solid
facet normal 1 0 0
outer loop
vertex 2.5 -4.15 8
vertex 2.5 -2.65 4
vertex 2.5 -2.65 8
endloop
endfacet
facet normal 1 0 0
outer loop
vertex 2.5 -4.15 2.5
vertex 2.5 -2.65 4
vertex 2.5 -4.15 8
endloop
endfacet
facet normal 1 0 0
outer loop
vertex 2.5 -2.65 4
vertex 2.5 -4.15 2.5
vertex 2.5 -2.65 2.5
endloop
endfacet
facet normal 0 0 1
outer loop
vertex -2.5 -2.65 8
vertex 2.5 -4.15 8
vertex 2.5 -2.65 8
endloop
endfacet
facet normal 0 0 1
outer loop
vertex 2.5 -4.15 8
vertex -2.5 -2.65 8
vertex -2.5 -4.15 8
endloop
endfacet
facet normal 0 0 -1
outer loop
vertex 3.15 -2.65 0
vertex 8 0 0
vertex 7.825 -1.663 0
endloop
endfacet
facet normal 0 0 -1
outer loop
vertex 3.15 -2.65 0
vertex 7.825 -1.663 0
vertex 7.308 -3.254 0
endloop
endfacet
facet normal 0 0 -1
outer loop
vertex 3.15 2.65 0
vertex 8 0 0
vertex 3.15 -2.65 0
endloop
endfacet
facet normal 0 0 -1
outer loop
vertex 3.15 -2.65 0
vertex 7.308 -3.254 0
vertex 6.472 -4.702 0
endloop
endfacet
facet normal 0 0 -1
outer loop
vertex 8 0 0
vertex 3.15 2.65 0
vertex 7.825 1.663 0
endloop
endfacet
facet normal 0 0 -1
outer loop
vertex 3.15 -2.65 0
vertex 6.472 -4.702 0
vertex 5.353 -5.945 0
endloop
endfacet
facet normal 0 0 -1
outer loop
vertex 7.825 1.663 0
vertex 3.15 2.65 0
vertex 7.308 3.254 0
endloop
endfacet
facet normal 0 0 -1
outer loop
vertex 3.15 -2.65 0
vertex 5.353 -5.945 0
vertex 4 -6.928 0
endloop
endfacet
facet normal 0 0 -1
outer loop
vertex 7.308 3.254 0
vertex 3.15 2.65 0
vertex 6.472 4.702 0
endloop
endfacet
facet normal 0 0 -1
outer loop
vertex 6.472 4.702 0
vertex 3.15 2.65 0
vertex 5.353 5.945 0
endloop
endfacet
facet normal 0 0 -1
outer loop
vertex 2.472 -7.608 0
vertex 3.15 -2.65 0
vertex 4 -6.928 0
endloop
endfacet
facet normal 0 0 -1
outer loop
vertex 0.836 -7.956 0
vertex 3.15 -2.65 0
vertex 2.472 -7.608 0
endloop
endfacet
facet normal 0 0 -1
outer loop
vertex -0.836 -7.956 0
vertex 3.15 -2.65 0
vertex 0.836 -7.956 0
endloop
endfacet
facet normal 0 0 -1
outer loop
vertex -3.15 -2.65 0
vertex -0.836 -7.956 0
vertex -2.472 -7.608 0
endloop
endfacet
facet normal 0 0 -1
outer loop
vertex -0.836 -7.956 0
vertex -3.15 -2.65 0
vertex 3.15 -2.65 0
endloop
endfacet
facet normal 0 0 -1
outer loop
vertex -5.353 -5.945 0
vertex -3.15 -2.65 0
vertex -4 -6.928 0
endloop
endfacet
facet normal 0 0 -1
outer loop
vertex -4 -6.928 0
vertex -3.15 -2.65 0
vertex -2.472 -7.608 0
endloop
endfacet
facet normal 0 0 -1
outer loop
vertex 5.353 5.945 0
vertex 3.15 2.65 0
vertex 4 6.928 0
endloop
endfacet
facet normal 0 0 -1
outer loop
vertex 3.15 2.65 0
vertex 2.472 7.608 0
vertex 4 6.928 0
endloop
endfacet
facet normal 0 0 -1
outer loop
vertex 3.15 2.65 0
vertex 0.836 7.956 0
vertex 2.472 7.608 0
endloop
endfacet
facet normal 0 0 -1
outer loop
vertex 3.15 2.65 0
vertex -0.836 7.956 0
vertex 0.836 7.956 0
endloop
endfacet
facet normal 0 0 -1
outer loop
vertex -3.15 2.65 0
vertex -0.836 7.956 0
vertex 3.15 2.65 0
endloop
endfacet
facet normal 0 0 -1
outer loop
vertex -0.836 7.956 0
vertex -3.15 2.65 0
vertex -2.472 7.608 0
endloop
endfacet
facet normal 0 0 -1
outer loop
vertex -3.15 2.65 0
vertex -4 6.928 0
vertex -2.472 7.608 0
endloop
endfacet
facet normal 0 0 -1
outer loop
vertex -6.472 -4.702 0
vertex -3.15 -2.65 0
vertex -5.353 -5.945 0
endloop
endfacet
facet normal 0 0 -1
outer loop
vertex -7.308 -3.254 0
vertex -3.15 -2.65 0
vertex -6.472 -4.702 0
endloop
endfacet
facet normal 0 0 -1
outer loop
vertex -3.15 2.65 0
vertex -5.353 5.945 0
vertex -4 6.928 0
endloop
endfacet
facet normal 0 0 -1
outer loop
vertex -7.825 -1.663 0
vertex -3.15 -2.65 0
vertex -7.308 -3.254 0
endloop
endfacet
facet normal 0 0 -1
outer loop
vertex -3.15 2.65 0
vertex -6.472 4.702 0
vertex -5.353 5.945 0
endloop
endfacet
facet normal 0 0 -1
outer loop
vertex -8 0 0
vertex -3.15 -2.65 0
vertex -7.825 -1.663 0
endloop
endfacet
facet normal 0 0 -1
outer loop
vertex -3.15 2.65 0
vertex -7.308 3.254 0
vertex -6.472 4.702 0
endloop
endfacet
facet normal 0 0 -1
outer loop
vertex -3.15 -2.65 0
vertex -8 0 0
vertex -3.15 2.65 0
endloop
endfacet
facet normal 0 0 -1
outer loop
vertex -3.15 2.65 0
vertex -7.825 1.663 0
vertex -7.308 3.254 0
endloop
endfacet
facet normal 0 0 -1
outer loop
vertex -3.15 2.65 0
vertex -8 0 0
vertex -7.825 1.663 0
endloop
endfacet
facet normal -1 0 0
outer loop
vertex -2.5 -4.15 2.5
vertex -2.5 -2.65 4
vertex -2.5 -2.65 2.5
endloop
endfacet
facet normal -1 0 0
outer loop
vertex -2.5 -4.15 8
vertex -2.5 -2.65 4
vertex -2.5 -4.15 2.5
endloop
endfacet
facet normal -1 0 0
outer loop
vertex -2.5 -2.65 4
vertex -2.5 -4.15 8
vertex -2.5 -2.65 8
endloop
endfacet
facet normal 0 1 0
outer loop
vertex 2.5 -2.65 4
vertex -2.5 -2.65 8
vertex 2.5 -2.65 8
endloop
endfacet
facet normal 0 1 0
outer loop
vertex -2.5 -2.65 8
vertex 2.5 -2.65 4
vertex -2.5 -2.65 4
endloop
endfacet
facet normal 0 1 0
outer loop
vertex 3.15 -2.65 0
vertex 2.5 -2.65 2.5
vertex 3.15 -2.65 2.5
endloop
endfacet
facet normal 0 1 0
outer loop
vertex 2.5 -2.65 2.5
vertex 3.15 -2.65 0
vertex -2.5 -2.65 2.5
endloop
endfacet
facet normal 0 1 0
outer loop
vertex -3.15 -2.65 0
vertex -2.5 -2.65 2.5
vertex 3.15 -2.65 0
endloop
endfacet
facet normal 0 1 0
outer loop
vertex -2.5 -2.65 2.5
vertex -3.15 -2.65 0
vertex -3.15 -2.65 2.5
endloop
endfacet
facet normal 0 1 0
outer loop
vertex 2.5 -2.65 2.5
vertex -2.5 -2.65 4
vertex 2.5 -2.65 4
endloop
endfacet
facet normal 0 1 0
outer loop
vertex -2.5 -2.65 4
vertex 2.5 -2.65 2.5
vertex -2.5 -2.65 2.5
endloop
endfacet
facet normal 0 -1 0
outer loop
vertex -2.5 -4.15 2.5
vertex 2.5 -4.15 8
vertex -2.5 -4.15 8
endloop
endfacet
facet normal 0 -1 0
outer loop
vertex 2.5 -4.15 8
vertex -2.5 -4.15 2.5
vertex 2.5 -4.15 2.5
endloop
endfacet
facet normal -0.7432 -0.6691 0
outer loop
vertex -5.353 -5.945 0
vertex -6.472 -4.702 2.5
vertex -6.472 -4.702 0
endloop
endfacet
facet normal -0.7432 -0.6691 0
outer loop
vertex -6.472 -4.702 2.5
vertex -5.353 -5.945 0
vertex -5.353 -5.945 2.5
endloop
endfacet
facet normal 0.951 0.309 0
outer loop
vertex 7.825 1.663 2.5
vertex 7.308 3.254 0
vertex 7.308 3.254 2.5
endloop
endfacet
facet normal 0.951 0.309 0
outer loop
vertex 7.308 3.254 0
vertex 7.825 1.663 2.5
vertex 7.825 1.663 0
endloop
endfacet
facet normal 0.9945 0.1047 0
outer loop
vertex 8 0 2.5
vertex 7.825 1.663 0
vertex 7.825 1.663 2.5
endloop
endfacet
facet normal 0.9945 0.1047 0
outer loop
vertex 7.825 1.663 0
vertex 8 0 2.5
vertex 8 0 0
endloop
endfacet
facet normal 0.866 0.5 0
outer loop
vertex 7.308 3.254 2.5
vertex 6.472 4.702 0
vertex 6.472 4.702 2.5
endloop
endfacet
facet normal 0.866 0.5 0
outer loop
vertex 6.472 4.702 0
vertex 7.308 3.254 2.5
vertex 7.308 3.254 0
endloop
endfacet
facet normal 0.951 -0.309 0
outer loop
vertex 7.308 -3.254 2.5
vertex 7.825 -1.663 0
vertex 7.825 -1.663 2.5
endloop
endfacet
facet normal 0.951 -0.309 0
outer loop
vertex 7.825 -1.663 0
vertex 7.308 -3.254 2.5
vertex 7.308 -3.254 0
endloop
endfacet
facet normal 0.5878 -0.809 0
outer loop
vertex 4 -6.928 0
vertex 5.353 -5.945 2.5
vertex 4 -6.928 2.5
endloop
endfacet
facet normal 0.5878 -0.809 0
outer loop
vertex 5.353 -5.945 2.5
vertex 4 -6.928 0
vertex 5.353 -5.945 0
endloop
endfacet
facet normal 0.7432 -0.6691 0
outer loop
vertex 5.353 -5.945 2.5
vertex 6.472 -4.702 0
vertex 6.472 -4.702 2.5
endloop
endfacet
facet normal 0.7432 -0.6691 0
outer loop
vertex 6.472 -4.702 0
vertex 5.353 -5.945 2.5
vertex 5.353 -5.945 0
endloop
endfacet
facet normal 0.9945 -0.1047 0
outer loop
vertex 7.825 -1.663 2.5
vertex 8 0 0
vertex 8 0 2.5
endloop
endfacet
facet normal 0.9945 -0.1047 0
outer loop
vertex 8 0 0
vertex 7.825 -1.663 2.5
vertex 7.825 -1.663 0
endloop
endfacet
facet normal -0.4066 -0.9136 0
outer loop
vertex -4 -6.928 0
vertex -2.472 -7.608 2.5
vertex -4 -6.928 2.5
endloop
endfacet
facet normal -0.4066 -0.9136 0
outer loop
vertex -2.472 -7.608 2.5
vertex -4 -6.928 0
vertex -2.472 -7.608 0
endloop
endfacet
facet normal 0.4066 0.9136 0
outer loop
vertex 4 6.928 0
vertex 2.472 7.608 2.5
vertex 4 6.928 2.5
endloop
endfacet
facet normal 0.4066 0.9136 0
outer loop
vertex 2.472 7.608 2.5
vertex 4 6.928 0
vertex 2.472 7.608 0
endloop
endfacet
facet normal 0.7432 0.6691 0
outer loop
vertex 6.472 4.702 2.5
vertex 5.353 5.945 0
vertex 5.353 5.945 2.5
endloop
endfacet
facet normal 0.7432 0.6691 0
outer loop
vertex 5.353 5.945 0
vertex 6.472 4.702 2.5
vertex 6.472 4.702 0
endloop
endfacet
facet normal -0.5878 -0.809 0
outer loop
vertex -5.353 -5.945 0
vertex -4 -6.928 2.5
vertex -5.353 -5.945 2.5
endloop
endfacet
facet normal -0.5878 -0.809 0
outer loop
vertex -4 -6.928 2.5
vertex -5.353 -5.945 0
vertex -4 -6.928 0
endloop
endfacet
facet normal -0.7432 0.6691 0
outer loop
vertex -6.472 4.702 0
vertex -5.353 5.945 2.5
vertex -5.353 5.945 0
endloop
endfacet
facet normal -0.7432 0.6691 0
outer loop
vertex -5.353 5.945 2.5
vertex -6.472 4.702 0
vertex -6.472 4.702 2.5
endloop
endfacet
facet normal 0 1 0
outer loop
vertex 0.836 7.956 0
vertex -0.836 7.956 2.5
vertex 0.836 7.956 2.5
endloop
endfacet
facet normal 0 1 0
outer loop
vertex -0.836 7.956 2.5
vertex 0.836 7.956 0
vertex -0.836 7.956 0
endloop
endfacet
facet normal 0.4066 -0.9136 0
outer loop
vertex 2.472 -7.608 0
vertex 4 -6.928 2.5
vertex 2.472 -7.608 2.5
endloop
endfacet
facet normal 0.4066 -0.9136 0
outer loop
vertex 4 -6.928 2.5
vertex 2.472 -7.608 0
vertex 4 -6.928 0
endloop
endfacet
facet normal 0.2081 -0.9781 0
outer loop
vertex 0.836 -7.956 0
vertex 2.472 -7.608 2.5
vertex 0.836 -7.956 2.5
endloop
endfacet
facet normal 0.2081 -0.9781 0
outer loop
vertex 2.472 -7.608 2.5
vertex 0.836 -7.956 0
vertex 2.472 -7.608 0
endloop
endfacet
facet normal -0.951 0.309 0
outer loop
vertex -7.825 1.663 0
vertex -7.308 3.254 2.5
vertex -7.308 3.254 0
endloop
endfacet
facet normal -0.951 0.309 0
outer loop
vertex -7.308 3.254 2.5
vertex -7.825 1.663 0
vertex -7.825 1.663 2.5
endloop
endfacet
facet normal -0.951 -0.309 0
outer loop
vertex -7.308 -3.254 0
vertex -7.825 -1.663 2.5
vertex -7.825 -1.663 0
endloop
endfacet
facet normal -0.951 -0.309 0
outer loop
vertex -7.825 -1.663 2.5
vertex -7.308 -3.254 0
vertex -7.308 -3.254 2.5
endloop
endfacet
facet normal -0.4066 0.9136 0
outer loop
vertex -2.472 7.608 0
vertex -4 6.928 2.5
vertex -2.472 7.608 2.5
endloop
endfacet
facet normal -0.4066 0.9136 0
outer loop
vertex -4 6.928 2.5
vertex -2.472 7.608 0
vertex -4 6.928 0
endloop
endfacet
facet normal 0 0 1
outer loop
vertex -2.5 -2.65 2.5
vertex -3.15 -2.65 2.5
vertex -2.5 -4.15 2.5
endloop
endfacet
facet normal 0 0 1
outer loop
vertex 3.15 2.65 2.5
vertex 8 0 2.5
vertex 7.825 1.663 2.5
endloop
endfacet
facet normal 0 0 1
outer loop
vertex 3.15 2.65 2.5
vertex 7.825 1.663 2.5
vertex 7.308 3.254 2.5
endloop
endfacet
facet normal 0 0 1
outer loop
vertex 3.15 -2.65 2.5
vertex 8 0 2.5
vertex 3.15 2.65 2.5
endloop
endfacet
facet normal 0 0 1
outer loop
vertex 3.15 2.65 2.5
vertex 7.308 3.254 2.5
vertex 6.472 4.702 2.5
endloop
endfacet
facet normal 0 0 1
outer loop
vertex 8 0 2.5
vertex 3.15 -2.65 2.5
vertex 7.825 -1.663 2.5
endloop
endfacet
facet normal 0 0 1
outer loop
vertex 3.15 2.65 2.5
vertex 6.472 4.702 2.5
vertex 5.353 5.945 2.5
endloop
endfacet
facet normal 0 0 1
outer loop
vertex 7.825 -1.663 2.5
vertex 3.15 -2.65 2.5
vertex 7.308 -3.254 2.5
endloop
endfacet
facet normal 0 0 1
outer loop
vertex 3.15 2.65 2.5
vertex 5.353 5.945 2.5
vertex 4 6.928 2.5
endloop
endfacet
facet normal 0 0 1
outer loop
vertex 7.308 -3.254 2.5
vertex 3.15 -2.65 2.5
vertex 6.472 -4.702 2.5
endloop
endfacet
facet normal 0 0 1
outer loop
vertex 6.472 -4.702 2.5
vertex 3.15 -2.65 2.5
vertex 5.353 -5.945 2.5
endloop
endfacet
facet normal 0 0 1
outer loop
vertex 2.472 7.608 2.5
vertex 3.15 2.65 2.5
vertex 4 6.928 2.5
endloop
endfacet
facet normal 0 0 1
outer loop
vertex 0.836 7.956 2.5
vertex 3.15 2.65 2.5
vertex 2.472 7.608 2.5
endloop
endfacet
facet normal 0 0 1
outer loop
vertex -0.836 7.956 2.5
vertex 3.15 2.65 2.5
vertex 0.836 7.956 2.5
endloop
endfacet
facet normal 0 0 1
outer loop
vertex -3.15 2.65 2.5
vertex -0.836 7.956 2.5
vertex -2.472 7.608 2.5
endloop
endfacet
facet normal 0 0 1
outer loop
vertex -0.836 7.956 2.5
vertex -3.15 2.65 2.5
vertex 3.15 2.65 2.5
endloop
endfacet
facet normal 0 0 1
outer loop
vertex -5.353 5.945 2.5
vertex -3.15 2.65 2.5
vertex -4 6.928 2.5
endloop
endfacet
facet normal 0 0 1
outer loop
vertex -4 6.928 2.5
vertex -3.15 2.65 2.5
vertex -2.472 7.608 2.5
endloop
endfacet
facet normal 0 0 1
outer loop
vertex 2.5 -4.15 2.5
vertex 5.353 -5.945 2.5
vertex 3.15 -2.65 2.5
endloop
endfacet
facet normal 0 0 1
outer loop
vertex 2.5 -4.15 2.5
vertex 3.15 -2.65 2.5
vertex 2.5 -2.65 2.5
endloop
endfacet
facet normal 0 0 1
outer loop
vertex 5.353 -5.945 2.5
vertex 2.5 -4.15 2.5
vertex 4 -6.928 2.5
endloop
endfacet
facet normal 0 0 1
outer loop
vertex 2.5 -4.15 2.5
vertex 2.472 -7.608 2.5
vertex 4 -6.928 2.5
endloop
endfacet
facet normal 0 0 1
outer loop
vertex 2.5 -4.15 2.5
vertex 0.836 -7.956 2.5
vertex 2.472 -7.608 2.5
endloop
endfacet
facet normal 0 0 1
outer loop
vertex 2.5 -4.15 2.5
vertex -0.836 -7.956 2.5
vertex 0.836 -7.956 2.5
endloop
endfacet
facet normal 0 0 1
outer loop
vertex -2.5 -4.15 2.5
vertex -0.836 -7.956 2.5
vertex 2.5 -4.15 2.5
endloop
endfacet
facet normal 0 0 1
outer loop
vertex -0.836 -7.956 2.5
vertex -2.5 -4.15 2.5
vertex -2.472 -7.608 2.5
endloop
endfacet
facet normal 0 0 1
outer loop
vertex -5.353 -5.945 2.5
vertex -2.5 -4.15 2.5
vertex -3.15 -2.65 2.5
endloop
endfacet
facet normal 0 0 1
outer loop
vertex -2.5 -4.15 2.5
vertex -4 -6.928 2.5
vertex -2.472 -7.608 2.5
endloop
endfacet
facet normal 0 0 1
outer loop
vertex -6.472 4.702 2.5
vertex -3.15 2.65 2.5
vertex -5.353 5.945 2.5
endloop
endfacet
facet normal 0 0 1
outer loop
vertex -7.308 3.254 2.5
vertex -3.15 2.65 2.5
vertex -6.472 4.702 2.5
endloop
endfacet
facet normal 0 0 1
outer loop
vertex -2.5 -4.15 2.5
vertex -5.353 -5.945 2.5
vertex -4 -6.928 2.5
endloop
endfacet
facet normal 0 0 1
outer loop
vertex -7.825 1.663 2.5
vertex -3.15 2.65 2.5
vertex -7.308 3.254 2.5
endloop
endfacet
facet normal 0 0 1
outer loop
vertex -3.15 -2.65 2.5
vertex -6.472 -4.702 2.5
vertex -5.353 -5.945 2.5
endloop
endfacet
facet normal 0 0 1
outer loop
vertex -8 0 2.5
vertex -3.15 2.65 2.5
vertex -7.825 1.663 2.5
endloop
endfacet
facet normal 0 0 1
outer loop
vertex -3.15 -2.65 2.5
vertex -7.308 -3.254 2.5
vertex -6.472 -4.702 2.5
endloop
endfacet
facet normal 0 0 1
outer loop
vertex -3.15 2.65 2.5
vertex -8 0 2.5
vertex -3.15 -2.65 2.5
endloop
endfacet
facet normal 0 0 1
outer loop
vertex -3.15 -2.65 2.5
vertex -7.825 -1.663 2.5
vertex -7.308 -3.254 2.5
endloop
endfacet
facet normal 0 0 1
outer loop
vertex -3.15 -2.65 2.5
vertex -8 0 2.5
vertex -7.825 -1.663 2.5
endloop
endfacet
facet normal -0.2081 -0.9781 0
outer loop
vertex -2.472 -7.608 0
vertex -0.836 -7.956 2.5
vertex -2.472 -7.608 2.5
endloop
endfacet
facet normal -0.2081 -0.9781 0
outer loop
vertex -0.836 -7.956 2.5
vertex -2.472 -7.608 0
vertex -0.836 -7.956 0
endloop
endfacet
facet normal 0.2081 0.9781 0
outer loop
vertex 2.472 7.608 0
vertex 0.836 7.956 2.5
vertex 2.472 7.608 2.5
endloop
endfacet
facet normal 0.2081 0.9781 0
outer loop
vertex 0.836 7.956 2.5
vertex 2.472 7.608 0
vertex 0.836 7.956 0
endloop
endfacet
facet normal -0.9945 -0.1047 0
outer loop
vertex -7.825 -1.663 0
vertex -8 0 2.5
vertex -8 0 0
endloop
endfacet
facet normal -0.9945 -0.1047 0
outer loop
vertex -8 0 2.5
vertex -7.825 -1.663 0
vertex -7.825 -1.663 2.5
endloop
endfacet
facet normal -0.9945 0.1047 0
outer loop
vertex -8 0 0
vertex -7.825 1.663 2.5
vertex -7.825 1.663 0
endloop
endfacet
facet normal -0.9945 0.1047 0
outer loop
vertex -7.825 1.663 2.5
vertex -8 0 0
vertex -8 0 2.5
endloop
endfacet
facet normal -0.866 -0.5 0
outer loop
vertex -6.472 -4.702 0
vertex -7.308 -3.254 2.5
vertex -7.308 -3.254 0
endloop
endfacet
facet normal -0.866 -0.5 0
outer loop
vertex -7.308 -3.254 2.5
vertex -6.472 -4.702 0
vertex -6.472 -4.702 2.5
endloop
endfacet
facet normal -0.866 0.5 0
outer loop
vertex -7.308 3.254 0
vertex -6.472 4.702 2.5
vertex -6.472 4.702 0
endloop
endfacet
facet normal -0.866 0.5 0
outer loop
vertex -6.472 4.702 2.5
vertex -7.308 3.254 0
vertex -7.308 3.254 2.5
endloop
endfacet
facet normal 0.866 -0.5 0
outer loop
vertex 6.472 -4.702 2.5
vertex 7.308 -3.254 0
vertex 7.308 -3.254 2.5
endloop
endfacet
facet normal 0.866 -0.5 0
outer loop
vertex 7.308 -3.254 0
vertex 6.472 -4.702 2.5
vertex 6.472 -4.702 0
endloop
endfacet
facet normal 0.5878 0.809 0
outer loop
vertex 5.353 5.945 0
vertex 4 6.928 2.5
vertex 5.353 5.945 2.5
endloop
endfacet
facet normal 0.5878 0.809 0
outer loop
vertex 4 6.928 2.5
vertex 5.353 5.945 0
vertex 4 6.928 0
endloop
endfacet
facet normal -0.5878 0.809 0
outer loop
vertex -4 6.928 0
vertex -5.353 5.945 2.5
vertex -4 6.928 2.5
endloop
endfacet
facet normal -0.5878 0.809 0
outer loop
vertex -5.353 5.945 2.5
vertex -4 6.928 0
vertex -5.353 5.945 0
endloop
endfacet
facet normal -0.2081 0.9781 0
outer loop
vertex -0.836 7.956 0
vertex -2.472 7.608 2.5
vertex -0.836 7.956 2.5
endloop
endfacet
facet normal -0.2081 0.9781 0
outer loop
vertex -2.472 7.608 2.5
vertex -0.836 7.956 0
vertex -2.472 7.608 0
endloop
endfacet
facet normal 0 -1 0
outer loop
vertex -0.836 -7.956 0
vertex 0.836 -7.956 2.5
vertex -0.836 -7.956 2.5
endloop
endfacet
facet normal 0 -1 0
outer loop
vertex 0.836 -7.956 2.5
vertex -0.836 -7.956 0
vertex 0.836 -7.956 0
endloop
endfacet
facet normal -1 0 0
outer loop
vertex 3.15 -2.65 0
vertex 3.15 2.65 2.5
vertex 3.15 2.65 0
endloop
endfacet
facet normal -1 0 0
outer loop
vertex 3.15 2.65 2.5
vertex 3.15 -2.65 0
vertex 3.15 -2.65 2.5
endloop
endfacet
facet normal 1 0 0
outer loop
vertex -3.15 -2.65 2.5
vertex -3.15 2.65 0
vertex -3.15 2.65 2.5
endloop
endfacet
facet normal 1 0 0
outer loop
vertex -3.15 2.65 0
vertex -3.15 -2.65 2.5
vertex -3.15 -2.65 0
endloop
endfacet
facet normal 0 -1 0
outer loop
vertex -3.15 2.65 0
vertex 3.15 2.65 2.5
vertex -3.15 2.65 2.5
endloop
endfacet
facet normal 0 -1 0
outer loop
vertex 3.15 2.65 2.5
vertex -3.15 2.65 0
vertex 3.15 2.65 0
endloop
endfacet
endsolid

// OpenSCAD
difference () {
  union () {
    translate ([0.000, -3.400, 0.000]) {
      translate ([0.000, 0.000, 4.000]) {
        cube (size = [ 5.000, 1.500, 8.000], center = true);
      }
    }
    translate ([0.000, 0.000, 1.250]) {
      cylinder(h = 2.500, r1 = 8.000, r2 = 8.000, center = true, $fn = 30.000);
    }
  }
  cube (size = [ 6.300, 5.300, 8.000], center = true);
}
